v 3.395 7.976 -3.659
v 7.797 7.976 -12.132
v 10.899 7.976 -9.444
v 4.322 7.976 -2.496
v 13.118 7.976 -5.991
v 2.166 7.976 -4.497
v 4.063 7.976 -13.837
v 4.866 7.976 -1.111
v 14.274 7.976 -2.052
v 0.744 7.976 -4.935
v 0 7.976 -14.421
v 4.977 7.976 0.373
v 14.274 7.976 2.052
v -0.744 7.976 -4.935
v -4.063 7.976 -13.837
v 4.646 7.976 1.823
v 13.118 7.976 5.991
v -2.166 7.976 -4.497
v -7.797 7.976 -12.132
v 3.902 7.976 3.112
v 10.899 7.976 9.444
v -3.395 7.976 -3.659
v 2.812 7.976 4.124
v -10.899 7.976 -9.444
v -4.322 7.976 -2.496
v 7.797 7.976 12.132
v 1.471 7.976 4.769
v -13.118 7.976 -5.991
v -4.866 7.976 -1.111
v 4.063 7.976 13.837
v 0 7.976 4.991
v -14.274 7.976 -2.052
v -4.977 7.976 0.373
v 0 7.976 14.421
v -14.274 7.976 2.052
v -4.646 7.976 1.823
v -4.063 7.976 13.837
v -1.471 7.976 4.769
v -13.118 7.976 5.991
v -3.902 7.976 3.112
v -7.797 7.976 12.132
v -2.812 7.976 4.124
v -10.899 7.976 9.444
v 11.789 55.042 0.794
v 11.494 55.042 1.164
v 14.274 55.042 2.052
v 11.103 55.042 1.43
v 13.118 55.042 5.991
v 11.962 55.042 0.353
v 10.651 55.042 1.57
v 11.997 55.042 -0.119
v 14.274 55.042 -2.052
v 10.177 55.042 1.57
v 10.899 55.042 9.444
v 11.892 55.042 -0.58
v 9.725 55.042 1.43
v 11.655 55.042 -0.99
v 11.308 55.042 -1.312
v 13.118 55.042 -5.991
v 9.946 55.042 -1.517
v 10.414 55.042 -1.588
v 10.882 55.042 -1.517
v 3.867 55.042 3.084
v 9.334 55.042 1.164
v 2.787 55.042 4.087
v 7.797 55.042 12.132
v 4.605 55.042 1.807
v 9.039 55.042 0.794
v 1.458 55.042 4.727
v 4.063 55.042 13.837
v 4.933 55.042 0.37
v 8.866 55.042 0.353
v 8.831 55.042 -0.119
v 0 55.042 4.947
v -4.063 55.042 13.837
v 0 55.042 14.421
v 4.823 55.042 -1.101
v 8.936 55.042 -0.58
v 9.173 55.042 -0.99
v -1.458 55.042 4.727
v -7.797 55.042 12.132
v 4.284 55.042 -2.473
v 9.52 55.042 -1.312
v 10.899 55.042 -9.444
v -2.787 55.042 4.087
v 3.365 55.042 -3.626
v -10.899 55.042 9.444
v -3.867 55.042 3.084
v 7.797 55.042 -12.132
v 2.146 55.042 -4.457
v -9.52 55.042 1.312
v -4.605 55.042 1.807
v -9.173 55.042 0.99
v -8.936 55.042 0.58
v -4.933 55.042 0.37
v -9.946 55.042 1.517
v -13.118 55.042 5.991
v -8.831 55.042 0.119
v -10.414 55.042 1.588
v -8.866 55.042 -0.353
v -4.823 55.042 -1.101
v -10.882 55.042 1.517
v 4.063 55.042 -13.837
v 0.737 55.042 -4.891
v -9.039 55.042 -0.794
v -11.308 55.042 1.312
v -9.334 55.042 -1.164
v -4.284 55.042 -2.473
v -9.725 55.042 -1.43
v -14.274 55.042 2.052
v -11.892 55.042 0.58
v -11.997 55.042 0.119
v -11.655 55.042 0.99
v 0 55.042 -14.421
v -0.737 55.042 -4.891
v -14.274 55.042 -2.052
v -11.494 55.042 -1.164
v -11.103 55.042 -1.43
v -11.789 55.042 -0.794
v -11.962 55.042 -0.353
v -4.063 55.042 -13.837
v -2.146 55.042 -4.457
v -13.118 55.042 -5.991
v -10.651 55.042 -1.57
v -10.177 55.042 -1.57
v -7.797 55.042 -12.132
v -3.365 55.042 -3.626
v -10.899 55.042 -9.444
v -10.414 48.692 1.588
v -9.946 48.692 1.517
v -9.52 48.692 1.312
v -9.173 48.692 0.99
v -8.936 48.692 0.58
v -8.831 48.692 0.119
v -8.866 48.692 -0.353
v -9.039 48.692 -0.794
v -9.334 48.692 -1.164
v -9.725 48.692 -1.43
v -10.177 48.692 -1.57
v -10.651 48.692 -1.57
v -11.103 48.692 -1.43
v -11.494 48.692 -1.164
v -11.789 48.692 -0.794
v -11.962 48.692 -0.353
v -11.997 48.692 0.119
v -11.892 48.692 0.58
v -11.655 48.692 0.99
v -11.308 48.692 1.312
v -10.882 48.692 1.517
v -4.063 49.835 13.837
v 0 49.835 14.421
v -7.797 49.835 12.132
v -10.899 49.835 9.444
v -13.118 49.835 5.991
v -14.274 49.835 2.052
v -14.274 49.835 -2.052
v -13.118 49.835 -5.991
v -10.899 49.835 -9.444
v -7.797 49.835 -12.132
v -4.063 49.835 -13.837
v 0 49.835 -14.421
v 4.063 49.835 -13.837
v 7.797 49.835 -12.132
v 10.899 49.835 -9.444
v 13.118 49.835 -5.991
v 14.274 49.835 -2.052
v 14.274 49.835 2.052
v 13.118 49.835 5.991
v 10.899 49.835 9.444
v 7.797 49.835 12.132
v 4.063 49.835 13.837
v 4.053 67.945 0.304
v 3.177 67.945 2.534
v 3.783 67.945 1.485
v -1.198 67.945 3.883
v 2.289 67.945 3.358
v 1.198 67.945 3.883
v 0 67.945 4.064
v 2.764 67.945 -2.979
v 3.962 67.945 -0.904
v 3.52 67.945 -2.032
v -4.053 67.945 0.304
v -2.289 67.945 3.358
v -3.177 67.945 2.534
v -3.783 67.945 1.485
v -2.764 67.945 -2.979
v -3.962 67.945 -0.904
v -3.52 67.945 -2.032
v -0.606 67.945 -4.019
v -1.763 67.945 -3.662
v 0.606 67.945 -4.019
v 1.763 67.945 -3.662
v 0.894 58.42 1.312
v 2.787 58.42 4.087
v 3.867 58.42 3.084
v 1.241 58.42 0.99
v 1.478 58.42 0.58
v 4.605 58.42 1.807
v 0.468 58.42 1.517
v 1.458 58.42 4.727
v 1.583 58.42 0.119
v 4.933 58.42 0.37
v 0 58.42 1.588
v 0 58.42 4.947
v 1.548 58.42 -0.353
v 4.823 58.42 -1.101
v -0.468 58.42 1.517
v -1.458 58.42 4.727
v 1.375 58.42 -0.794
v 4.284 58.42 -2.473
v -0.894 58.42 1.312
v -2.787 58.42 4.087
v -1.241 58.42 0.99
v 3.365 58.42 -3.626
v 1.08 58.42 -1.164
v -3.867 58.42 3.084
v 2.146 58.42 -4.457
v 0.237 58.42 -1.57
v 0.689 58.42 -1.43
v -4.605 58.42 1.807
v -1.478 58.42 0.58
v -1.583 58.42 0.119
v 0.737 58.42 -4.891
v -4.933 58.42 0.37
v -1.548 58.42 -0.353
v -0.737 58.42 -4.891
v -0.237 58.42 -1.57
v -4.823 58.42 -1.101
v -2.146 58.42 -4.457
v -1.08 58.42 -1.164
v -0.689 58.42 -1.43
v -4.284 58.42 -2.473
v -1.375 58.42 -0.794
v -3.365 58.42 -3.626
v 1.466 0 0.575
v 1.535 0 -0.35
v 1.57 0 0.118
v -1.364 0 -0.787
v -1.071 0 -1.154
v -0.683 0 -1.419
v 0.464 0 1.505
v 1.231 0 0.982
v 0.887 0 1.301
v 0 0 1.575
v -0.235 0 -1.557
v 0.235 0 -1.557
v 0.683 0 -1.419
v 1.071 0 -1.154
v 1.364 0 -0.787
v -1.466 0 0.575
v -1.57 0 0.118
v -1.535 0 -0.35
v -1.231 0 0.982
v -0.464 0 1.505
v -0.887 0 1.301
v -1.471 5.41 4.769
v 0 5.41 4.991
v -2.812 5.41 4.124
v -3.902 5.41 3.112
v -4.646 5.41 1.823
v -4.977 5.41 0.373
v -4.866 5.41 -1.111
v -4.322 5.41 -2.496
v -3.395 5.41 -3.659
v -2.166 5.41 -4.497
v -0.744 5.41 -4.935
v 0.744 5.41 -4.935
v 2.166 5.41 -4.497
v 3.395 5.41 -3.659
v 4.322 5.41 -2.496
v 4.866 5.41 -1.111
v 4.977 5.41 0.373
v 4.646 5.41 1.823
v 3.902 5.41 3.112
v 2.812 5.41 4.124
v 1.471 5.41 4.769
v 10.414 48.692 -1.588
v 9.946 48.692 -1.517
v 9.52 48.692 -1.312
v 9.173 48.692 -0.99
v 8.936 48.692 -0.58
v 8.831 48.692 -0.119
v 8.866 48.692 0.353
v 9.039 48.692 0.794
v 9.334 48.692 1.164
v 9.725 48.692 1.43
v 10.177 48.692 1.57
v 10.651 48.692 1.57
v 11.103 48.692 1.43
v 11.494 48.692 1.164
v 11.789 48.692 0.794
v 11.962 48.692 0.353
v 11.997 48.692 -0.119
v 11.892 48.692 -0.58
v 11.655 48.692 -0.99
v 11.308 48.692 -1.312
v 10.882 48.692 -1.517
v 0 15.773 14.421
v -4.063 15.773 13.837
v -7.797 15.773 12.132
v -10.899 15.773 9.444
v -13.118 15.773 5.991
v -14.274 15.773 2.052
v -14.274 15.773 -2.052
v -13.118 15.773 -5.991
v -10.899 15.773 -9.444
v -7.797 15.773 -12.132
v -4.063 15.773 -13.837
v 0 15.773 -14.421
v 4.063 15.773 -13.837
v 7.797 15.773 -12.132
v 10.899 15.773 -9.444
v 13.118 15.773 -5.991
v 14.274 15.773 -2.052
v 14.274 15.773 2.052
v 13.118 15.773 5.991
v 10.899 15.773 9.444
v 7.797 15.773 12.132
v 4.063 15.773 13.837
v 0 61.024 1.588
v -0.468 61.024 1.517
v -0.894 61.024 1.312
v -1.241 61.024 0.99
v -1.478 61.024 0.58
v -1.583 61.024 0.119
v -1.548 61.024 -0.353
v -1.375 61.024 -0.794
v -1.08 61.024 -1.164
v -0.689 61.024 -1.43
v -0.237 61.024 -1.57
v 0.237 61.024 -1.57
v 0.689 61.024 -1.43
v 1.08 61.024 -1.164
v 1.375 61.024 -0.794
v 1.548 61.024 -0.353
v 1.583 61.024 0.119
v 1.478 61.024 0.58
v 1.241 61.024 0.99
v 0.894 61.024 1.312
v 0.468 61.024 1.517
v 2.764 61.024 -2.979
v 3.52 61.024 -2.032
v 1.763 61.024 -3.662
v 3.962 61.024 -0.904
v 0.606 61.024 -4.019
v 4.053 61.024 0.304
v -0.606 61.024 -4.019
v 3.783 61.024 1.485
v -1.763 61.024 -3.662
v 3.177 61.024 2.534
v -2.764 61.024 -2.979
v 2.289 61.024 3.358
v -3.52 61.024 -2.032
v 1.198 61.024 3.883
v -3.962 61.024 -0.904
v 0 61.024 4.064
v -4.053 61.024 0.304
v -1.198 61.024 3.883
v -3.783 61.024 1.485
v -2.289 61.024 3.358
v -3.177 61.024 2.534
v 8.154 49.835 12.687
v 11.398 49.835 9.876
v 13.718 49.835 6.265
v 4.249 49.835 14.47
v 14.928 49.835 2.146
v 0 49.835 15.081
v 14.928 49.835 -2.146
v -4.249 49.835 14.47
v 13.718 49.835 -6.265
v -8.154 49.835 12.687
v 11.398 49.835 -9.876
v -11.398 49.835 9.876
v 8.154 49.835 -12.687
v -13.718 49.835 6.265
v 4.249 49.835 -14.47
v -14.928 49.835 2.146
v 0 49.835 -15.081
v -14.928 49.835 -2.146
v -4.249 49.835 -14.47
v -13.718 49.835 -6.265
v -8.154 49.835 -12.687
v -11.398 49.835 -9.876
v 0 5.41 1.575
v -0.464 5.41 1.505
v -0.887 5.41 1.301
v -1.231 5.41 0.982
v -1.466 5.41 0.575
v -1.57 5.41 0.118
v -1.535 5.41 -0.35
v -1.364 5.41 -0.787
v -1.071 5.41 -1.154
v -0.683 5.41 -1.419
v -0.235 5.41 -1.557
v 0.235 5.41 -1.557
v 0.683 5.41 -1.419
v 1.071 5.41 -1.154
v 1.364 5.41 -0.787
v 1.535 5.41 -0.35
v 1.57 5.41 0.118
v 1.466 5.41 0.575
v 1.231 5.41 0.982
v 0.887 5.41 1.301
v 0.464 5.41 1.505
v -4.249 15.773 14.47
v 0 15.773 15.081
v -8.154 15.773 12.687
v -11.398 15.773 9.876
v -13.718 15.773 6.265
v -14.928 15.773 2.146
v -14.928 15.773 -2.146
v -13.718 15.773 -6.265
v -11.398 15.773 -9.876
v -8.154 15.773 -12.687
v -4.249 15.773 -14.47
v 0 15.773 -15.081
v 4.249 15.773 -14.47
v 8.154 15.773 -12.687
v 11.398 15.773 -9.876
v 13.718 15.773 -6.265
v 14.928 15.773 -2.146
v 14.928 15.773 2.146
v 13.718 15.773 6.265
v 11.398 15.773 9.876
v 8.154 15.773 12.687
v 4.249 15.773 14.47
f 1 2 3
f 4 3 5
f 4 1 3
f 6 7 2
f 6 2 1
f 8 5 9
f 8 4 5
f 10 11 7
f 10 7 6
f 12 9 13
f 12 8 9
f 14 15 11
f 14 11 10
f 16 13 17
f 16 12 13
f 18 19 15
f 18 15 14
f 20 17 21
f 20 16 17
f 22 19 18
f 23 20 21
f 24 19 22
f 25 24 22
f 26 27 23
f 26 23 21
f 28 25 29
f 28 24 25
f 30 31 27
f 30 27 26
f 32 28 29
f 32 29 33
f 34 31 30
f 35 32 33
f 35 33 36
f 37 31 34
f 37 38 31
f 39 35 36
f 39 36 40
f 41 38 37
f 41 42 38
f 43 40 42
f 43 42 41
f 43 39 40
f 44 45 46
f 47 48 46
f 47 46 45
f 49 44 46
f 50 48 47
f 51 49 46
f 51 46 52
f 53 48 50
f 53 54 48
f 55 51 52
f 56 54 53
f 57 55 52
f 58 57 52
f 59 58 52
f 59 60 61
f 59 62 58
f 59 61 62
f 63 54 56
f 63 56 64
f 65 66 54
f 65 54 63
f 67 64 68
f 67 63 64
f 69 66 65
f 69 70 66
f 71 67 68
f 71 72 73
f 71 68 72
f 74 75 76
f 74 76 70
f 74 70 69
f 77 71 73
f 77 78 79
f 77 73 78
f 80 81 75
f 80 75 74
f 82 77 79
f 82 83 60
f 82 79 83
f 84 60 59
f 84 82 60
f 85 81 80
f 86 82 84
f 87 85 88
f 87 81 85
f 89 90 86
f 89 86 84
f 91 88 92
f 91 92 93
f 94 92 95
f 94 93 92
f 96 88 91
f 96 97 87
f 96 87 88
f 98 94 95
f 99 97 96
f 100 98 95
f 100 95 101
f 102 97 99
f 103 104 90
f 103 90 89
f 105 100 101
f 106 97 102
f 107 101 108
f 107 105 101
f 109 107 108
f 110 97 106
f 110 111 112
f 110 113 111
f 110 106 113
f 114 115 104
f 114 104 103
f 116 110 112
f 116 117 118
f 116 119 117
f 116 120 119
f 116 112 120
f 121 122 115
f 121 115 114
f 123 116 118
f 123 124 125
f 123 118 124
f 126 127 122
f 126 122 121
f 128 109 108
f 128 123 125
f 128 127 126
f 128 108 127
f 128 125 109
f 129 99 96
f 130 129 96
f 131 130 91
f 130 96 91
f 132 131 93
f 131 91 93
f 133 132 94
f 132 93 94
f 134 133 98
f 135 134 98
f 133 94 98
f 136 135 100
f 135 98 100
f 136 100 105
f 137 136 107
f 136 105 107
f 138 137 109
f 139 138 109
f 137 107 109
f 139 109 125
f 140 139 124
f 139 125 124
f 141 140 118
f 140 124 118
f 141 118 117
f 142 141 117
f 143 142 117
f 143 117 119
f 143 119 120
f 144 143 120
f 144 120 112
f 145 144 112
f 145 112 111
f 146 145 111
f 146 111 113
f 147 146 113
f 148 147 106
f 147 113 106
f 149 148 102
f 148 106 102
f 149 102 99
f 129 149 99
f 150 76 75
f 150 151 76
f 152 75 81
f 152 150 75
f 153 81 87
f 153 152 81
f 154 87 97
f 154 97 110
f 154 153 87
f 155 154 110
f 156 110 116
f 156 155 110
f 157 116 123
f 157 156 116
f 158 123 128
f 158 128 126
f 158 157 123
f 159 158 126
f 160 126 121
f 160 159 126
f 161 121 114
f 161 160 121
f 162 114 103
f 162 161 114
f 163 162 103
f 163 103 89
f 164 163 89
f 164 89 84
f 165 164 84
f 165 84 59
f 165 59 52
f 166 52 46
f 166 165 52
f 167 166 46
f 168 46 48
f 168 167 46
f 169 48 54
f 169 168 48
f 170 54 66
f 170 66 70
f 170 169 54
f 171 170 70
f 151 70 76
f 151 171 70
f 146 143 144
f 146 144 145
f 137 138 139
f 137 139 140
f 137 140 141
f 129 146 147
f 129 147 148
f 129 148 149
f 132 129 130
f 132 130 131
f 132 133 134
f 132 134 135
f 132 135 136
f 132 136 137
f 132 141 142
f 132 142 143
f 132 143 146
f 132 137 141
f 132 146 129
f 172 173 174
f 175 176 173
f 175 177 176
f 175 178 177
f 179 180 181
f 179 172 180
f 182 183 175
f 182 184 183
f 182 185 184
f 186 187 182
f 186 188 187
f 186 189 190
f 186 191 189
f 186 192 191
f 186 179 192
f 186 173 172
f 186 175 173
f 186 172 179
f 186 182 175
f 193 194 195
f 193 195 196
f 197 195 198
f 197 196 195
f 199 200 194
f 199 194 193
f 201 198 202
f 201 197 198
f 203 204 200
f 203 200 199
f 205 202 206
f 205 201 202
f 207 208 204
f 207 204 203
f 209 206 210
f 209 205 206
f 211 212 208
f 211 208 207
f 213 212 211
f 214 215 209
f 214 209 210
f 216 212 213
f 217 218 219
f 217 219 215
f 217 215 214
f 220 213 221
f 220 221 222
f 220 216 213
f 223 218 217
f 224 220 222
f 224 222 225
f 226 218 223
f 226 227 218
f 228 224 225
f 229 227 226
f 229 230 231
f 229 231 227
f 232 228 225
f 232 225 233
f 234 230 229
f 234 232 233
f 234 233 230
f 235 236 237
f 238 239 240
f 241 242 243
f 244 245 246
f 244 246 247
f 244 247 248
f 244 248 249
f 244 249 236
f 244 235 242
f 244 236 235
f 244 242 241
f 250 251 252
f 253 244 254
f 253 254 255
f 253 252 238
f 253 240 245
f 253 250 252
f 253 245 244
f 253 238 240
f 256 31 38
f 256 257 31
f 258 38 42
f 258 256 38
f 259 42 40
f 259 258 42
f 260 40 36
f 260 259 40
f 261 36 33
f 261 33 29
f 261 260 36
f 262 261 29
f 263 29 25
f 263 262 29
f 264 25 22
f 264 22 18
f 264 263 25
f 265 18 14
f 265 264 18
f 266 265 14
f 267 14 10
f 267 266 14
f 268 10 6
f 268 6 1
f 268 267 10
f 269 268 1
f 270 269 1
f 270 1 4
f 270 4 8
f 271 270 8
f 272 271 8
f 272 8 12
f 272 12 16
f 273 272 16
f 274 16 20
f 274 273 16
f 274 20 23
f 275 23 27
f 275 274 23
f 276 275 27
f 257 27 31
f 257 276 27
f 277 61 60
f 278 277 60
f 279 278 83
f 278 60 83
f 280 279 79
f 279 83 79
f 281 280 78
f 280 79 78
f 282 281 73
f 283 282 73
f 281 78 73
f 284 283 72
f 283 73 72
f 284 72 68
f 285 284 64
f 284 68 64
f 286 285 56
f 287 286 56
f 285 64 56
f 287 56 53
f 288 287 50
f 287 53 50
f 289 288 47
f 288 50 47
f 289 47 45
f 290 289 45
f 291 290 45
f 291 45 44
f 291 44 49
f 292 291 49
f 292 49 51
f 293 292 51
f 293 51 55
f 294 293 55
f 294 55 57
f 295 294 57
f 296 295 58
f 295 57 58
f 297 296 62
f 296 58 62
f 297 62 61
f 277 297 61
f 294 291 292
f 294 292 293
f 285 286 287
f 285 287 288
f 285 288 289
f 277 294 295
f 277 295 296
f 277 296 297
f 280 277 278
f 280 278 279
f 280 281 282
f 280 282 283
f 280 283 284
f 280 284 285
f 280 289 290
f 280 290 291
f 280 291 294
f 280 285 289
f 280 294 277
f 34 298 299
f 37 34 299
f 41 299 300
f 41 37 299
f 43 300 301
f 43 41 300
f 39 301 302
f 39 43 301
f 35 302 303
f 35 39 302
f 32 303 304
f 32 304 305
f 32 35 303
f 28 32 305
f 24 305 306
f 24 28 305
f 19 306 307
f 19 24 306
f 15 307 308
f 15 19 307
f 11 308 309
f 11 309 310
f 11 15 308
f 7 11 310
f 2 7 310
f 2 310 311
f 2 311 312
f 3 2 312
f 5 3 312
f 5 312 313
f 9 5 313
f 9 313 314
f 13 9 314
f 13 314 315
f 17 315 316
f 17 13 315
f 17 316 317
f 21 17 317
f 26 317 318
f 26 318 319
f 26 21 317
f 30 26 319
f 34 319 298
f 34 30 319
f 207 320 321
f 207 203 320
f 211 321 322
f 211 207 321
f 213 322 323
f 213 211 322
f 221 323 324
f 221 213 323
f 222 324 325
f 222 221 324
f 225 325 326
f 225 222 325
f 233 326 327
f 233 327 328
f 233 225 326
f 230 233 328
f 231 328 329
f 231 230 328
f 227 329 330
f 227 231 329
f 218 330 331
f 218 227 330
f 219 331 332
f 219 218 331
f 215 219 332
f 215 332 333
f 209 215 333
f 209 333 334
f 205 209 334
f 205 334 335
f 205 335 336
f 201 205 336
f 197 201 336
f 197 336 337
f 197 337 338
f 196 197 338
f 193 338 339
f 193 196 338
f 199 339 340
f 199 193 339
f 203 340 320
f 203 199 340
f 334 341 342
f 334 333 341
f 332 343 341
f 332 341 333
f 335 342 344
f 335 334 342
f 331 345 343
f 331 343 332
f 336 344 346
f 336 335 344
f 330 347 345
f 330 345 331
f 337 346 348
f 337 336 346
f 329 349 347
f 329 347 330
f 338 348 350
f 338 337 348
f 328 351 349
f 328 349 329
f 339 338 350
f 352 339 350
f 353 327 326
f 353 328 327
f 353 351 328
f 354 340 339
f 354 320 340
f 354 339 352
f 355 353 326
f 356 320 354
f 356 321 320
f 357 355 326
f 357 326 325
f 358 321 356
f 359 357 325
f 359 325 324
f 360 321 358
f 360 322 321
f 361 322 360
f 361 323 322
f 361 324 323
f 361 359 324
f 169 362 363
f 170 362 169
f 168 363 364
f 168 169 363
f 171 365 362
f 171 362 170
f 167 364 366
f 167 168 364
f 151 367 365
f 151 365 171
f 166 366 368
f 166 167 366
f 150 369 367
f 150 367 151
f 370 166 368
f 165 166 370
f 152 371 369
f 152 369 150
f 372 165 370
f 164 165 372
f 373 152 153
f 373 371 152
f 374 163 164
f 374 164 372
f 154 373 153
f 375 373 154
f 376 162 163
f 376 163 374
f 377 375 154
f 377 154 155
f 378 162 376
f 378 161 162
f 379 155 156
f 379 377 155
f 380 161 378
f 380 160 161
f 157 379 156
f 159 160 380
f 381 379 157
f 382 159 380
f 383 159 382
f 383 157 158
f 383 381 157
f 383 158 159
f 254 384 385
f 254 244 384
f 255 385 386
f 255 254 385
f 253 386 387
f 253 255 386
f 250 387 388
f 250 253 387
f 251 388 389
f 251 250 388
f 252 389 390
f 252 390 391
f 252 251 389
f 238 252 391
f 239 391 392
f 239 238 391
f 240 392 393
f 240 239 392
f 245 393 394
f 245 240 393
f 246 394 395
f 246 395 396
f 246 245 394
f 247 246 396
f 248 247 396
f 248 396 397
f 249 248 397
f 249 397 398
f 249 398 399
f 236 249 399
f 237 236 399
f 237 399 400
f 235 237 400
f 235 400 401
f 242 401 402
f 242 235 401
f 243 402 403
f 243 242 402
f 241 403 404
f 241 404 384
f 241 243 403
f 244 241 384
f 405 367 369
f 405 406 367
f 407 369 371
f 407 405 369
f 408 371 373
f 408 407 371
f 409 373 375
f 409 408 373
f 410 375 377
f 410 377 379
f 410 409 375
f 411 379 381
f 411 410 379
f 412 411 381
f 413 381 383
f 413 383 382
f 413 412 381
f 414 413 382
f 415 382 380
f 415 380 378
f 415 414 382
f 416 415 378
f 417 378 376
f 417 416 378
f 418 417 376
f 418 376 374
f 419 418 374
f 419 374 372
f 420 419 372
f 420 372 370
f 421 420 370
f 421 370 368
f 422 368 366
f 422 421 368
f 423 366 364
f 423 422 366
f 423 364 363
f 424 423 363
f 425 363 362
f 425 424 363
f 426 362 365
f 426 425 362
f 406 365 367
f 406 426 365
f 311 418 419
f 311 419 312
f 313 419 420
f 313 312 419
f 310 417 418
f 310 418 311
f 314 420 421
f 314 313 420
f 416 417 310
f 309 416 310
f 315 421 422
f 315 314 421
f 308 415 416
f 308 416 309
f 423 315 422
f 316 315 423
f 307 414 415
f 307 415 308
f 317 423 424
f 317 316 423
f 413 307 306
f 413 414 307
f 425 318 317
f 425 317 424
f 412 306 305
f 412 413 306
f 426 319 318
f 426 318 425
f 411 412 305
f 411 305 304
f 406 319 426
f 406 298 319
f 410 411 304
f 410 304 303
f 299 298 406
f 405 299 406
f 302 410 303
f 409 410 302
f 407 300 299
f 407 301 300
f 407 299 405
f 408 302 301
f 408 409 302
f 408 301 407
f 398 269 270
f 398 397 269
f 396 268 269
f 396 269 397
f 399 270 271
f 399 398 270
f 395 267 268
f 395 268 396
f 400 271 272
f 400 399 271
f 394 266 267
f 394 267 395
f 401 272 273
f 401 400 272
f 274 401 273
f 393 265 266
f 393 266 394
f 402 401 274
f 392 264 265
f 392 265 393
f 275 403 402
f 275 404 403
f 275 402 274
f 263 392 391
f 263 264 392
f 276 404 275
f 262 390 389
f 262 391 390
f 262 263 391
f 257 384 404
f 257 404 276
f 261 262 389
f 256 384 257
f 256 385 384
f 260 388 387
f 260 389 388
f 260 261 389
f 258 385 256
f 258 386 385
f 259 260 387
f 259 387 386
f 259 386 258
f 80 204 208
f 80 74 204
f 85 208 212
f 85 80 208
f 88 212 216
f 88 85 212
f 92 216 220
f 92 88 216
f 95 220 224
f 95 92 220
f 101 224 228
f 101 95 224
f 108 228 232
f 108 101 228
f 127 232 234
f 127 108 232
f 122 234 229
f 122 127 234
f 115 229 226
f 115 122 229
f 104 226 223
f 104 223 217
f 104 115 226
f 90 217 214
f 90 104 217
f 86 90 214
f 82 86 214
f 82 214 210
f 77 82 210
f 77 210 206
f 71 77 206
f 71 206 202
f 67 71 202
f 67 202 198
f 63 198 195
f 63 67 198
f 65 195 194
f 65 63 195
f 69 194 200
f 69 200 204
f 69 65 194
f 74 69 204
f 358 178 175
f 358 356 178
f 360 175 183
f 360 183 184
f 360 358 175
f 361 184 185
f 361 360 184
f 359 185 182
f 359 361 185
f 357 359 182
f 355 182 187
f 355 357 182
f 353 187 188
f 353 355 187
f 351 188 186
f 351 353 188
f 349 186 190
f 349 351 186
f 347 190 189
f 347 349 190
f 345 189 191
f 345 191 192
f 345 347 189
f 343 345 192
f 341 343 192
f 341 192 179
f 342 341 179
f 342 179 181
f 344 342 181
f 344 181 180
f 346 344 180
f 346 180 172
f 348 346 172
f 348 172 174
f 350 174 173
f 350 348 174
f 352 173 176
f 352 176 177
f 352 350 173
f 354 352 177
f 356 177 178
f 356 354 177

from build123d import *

# Parameters (mm, degrees)
SKETCH2_R          = 1.5875
CUT_EXTRUDE1_DEPTH = 6.35


with BuildPart() as part:
    # Sketch1 → Revolve1 (revolve)
    with BuildSketch(Plane(origin=(0, 0, 0), x_dir=(0, 0, -1), z_dir=(1, 0, 0)), mode=Mode.PRIVATE) as revolve1_sk:
        Polygon((0, 0), (0, 36.261189321), (0, 67.945), (4.064, 67.945), (4.064, 61.0235), (1.5875, 61.0235), (1.5875, 58.42), (4.94665, 58.42), (4.94665, 55.0418), (14.42085, 55.0418), (14.42085, 49.8348), (15.08125, 49.8348), (15.08125, 15.7734), (14.42085, 15.7734), (14.42085, 7.9756), (4.9911, 7.9756), (4.9911, 5.4102), (1.5748, 5.4102), (1.5748, 0), align=None)
    revolve(revolve1_sk.sketch.rotate(Axis((0, 67.945, 0), (0, -1, 0)), 180), axis=Axis((0, 67.945, 0), (0, -1, 0)))

    # Sketch2 → Cut-Extrude1 (cut)
    with BuildSketch(Plane(origin=(0, 55.0418, 0), x_dir=(1, 0, 0), z_dir=(0, 1, 0))):
        with Locations(Location((-10.414, 0, 0), (0, 0, 270))):
            Circle(SKETCH2_R)
        with Locations(Location((10.414, 0, 0), (0, 0, 90))):
            Circle(SKETCH2_R)
    extrude(amount=-CUT_EXTRUDE1_DEPTH, mode=Mode.SUBTRACT)


solid = part.part
